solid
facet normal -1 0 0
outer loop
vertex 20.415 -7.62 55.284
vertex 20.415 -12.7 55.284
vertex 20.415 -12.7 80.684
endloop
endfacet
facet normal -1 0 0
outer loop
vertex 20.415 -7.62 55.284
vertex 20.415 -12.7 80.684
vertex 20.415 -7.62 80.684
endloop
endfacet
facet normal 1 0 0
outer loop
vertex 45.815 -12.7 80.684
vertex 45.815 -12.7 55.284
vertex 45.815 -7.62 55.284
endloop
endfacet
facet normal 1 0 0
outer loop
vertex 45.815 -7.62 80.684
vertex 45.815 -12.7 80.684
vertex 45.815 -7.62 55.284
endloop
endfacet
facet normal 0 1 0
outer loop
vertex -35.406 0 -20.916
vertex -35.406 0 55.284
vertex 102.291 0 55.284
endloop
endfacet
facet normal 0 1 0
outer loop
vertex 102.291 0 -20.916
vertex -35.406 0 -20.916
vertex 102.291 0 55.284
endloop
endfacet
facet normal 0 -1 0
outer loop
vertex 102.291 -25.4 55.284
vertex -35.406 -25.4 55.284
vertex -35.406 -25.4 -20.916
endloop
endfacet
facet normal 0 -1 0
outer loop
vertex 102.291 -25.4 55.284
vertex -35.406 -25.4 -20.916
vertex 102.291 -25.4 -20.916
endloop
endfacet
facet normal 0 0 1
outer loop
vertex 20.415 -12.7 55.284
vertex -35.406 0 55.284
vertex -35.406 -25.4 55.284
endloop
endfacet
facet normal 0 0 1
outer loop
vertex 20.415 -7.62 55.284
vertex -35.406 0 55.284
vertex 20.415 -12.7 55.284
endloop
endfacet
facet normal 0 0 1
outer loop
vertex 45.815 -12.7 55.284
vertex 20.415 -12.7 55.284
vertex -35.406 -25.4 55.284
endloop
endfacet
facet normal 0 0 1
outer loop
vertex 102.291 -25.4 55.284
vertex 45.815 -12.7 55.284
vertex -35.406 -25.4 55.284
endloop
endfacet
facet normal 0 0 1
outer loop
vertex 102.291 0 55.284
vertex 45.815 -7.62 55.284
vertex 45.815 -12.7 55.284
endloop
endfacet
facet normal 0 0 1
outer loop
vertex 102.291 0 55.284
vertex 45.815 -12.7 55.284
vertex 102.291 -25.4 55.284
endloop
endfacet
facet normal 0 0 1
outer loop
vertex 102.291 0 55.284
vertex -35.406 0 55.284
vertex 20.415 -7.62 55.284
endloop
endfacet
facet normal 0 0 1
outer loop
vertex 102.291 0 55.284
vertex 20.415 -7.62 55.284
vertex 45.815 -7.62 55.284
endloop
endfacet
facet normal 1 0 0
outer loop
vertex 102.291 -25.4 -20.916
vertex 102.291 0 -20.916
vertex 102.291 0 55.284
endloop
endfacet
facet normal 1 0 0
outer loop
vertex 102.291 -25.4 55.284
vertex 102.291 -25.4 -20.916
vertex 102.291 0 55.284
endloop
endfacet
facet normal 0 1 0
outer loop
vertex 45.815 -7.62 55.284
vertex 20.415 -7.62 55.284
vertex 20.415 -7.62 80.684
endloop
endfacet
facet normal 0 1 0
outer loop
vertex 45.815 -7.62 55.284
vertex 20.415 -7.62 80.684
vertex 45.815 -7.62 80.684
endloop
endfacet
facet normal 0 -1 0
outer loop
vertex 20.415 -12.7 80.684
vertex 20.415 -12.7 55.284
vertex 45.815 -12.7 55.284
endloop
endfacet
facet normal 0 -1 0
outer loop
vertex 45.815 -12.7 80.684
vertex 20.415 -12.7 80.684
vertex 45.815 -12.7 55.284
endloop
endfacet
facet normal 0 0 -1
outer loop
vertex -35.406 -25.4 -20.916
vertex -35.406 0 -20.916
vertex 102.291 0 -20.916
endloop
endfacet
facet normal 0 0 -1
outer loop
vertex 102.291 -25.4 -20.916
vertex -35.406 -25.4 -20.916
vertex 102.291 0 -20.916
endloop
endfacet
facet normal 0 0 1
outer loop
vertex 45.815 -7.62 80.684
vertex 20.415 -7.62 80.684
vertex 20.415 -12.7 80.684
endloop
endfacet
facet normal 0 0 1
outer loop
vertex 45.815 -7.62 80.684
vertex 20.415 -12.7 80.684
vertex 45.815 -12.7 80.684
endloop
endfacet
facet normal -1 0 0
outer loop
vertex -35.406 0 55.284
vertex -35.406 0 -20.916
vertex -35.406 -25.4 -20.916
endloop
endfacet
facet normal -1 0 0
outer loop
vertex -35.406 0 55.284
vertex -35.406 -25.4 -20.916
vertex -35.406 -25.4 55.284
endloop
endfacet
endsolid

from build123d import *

# Parameters (mm, degrees)
F0_W     = 137.6970596611
F0_H     = 76.2
F1_DEPTH = 10.922
F2_DEPTH = 25.4
F3_W     = 25.4
F3_H     = 5.08
F4_DEPTH = 25.4


with BuildPart() as f1:
    # F0 (on Front) → F1 (new body)
    with BuildSketch(Plane.XZ):
        with Locations((33.4425289184, 17.1839999914)):
            Rectangle(F0_W, F0_H)
    extrude(amount=F1_DEPTH)

    # F0 (on Front) → F2 (join)
    with BuildSketch(Plane.XZ):
        with Locations((33.4425289184, 17.1839999914)):
            Rectangle(F0_W, F0_H)
    extrude(amount=F2_DEPTH)

    # F3 (on face) → F4 (join)
    with BuildSketch(Plane.XY.offset(55.2839999914)):
        with Locations((33.1148739576, -10.16)):
            Rectangle(F3_W, F3_H)
    extrude(amount=F4_DEPTH)


solid = f1.part
